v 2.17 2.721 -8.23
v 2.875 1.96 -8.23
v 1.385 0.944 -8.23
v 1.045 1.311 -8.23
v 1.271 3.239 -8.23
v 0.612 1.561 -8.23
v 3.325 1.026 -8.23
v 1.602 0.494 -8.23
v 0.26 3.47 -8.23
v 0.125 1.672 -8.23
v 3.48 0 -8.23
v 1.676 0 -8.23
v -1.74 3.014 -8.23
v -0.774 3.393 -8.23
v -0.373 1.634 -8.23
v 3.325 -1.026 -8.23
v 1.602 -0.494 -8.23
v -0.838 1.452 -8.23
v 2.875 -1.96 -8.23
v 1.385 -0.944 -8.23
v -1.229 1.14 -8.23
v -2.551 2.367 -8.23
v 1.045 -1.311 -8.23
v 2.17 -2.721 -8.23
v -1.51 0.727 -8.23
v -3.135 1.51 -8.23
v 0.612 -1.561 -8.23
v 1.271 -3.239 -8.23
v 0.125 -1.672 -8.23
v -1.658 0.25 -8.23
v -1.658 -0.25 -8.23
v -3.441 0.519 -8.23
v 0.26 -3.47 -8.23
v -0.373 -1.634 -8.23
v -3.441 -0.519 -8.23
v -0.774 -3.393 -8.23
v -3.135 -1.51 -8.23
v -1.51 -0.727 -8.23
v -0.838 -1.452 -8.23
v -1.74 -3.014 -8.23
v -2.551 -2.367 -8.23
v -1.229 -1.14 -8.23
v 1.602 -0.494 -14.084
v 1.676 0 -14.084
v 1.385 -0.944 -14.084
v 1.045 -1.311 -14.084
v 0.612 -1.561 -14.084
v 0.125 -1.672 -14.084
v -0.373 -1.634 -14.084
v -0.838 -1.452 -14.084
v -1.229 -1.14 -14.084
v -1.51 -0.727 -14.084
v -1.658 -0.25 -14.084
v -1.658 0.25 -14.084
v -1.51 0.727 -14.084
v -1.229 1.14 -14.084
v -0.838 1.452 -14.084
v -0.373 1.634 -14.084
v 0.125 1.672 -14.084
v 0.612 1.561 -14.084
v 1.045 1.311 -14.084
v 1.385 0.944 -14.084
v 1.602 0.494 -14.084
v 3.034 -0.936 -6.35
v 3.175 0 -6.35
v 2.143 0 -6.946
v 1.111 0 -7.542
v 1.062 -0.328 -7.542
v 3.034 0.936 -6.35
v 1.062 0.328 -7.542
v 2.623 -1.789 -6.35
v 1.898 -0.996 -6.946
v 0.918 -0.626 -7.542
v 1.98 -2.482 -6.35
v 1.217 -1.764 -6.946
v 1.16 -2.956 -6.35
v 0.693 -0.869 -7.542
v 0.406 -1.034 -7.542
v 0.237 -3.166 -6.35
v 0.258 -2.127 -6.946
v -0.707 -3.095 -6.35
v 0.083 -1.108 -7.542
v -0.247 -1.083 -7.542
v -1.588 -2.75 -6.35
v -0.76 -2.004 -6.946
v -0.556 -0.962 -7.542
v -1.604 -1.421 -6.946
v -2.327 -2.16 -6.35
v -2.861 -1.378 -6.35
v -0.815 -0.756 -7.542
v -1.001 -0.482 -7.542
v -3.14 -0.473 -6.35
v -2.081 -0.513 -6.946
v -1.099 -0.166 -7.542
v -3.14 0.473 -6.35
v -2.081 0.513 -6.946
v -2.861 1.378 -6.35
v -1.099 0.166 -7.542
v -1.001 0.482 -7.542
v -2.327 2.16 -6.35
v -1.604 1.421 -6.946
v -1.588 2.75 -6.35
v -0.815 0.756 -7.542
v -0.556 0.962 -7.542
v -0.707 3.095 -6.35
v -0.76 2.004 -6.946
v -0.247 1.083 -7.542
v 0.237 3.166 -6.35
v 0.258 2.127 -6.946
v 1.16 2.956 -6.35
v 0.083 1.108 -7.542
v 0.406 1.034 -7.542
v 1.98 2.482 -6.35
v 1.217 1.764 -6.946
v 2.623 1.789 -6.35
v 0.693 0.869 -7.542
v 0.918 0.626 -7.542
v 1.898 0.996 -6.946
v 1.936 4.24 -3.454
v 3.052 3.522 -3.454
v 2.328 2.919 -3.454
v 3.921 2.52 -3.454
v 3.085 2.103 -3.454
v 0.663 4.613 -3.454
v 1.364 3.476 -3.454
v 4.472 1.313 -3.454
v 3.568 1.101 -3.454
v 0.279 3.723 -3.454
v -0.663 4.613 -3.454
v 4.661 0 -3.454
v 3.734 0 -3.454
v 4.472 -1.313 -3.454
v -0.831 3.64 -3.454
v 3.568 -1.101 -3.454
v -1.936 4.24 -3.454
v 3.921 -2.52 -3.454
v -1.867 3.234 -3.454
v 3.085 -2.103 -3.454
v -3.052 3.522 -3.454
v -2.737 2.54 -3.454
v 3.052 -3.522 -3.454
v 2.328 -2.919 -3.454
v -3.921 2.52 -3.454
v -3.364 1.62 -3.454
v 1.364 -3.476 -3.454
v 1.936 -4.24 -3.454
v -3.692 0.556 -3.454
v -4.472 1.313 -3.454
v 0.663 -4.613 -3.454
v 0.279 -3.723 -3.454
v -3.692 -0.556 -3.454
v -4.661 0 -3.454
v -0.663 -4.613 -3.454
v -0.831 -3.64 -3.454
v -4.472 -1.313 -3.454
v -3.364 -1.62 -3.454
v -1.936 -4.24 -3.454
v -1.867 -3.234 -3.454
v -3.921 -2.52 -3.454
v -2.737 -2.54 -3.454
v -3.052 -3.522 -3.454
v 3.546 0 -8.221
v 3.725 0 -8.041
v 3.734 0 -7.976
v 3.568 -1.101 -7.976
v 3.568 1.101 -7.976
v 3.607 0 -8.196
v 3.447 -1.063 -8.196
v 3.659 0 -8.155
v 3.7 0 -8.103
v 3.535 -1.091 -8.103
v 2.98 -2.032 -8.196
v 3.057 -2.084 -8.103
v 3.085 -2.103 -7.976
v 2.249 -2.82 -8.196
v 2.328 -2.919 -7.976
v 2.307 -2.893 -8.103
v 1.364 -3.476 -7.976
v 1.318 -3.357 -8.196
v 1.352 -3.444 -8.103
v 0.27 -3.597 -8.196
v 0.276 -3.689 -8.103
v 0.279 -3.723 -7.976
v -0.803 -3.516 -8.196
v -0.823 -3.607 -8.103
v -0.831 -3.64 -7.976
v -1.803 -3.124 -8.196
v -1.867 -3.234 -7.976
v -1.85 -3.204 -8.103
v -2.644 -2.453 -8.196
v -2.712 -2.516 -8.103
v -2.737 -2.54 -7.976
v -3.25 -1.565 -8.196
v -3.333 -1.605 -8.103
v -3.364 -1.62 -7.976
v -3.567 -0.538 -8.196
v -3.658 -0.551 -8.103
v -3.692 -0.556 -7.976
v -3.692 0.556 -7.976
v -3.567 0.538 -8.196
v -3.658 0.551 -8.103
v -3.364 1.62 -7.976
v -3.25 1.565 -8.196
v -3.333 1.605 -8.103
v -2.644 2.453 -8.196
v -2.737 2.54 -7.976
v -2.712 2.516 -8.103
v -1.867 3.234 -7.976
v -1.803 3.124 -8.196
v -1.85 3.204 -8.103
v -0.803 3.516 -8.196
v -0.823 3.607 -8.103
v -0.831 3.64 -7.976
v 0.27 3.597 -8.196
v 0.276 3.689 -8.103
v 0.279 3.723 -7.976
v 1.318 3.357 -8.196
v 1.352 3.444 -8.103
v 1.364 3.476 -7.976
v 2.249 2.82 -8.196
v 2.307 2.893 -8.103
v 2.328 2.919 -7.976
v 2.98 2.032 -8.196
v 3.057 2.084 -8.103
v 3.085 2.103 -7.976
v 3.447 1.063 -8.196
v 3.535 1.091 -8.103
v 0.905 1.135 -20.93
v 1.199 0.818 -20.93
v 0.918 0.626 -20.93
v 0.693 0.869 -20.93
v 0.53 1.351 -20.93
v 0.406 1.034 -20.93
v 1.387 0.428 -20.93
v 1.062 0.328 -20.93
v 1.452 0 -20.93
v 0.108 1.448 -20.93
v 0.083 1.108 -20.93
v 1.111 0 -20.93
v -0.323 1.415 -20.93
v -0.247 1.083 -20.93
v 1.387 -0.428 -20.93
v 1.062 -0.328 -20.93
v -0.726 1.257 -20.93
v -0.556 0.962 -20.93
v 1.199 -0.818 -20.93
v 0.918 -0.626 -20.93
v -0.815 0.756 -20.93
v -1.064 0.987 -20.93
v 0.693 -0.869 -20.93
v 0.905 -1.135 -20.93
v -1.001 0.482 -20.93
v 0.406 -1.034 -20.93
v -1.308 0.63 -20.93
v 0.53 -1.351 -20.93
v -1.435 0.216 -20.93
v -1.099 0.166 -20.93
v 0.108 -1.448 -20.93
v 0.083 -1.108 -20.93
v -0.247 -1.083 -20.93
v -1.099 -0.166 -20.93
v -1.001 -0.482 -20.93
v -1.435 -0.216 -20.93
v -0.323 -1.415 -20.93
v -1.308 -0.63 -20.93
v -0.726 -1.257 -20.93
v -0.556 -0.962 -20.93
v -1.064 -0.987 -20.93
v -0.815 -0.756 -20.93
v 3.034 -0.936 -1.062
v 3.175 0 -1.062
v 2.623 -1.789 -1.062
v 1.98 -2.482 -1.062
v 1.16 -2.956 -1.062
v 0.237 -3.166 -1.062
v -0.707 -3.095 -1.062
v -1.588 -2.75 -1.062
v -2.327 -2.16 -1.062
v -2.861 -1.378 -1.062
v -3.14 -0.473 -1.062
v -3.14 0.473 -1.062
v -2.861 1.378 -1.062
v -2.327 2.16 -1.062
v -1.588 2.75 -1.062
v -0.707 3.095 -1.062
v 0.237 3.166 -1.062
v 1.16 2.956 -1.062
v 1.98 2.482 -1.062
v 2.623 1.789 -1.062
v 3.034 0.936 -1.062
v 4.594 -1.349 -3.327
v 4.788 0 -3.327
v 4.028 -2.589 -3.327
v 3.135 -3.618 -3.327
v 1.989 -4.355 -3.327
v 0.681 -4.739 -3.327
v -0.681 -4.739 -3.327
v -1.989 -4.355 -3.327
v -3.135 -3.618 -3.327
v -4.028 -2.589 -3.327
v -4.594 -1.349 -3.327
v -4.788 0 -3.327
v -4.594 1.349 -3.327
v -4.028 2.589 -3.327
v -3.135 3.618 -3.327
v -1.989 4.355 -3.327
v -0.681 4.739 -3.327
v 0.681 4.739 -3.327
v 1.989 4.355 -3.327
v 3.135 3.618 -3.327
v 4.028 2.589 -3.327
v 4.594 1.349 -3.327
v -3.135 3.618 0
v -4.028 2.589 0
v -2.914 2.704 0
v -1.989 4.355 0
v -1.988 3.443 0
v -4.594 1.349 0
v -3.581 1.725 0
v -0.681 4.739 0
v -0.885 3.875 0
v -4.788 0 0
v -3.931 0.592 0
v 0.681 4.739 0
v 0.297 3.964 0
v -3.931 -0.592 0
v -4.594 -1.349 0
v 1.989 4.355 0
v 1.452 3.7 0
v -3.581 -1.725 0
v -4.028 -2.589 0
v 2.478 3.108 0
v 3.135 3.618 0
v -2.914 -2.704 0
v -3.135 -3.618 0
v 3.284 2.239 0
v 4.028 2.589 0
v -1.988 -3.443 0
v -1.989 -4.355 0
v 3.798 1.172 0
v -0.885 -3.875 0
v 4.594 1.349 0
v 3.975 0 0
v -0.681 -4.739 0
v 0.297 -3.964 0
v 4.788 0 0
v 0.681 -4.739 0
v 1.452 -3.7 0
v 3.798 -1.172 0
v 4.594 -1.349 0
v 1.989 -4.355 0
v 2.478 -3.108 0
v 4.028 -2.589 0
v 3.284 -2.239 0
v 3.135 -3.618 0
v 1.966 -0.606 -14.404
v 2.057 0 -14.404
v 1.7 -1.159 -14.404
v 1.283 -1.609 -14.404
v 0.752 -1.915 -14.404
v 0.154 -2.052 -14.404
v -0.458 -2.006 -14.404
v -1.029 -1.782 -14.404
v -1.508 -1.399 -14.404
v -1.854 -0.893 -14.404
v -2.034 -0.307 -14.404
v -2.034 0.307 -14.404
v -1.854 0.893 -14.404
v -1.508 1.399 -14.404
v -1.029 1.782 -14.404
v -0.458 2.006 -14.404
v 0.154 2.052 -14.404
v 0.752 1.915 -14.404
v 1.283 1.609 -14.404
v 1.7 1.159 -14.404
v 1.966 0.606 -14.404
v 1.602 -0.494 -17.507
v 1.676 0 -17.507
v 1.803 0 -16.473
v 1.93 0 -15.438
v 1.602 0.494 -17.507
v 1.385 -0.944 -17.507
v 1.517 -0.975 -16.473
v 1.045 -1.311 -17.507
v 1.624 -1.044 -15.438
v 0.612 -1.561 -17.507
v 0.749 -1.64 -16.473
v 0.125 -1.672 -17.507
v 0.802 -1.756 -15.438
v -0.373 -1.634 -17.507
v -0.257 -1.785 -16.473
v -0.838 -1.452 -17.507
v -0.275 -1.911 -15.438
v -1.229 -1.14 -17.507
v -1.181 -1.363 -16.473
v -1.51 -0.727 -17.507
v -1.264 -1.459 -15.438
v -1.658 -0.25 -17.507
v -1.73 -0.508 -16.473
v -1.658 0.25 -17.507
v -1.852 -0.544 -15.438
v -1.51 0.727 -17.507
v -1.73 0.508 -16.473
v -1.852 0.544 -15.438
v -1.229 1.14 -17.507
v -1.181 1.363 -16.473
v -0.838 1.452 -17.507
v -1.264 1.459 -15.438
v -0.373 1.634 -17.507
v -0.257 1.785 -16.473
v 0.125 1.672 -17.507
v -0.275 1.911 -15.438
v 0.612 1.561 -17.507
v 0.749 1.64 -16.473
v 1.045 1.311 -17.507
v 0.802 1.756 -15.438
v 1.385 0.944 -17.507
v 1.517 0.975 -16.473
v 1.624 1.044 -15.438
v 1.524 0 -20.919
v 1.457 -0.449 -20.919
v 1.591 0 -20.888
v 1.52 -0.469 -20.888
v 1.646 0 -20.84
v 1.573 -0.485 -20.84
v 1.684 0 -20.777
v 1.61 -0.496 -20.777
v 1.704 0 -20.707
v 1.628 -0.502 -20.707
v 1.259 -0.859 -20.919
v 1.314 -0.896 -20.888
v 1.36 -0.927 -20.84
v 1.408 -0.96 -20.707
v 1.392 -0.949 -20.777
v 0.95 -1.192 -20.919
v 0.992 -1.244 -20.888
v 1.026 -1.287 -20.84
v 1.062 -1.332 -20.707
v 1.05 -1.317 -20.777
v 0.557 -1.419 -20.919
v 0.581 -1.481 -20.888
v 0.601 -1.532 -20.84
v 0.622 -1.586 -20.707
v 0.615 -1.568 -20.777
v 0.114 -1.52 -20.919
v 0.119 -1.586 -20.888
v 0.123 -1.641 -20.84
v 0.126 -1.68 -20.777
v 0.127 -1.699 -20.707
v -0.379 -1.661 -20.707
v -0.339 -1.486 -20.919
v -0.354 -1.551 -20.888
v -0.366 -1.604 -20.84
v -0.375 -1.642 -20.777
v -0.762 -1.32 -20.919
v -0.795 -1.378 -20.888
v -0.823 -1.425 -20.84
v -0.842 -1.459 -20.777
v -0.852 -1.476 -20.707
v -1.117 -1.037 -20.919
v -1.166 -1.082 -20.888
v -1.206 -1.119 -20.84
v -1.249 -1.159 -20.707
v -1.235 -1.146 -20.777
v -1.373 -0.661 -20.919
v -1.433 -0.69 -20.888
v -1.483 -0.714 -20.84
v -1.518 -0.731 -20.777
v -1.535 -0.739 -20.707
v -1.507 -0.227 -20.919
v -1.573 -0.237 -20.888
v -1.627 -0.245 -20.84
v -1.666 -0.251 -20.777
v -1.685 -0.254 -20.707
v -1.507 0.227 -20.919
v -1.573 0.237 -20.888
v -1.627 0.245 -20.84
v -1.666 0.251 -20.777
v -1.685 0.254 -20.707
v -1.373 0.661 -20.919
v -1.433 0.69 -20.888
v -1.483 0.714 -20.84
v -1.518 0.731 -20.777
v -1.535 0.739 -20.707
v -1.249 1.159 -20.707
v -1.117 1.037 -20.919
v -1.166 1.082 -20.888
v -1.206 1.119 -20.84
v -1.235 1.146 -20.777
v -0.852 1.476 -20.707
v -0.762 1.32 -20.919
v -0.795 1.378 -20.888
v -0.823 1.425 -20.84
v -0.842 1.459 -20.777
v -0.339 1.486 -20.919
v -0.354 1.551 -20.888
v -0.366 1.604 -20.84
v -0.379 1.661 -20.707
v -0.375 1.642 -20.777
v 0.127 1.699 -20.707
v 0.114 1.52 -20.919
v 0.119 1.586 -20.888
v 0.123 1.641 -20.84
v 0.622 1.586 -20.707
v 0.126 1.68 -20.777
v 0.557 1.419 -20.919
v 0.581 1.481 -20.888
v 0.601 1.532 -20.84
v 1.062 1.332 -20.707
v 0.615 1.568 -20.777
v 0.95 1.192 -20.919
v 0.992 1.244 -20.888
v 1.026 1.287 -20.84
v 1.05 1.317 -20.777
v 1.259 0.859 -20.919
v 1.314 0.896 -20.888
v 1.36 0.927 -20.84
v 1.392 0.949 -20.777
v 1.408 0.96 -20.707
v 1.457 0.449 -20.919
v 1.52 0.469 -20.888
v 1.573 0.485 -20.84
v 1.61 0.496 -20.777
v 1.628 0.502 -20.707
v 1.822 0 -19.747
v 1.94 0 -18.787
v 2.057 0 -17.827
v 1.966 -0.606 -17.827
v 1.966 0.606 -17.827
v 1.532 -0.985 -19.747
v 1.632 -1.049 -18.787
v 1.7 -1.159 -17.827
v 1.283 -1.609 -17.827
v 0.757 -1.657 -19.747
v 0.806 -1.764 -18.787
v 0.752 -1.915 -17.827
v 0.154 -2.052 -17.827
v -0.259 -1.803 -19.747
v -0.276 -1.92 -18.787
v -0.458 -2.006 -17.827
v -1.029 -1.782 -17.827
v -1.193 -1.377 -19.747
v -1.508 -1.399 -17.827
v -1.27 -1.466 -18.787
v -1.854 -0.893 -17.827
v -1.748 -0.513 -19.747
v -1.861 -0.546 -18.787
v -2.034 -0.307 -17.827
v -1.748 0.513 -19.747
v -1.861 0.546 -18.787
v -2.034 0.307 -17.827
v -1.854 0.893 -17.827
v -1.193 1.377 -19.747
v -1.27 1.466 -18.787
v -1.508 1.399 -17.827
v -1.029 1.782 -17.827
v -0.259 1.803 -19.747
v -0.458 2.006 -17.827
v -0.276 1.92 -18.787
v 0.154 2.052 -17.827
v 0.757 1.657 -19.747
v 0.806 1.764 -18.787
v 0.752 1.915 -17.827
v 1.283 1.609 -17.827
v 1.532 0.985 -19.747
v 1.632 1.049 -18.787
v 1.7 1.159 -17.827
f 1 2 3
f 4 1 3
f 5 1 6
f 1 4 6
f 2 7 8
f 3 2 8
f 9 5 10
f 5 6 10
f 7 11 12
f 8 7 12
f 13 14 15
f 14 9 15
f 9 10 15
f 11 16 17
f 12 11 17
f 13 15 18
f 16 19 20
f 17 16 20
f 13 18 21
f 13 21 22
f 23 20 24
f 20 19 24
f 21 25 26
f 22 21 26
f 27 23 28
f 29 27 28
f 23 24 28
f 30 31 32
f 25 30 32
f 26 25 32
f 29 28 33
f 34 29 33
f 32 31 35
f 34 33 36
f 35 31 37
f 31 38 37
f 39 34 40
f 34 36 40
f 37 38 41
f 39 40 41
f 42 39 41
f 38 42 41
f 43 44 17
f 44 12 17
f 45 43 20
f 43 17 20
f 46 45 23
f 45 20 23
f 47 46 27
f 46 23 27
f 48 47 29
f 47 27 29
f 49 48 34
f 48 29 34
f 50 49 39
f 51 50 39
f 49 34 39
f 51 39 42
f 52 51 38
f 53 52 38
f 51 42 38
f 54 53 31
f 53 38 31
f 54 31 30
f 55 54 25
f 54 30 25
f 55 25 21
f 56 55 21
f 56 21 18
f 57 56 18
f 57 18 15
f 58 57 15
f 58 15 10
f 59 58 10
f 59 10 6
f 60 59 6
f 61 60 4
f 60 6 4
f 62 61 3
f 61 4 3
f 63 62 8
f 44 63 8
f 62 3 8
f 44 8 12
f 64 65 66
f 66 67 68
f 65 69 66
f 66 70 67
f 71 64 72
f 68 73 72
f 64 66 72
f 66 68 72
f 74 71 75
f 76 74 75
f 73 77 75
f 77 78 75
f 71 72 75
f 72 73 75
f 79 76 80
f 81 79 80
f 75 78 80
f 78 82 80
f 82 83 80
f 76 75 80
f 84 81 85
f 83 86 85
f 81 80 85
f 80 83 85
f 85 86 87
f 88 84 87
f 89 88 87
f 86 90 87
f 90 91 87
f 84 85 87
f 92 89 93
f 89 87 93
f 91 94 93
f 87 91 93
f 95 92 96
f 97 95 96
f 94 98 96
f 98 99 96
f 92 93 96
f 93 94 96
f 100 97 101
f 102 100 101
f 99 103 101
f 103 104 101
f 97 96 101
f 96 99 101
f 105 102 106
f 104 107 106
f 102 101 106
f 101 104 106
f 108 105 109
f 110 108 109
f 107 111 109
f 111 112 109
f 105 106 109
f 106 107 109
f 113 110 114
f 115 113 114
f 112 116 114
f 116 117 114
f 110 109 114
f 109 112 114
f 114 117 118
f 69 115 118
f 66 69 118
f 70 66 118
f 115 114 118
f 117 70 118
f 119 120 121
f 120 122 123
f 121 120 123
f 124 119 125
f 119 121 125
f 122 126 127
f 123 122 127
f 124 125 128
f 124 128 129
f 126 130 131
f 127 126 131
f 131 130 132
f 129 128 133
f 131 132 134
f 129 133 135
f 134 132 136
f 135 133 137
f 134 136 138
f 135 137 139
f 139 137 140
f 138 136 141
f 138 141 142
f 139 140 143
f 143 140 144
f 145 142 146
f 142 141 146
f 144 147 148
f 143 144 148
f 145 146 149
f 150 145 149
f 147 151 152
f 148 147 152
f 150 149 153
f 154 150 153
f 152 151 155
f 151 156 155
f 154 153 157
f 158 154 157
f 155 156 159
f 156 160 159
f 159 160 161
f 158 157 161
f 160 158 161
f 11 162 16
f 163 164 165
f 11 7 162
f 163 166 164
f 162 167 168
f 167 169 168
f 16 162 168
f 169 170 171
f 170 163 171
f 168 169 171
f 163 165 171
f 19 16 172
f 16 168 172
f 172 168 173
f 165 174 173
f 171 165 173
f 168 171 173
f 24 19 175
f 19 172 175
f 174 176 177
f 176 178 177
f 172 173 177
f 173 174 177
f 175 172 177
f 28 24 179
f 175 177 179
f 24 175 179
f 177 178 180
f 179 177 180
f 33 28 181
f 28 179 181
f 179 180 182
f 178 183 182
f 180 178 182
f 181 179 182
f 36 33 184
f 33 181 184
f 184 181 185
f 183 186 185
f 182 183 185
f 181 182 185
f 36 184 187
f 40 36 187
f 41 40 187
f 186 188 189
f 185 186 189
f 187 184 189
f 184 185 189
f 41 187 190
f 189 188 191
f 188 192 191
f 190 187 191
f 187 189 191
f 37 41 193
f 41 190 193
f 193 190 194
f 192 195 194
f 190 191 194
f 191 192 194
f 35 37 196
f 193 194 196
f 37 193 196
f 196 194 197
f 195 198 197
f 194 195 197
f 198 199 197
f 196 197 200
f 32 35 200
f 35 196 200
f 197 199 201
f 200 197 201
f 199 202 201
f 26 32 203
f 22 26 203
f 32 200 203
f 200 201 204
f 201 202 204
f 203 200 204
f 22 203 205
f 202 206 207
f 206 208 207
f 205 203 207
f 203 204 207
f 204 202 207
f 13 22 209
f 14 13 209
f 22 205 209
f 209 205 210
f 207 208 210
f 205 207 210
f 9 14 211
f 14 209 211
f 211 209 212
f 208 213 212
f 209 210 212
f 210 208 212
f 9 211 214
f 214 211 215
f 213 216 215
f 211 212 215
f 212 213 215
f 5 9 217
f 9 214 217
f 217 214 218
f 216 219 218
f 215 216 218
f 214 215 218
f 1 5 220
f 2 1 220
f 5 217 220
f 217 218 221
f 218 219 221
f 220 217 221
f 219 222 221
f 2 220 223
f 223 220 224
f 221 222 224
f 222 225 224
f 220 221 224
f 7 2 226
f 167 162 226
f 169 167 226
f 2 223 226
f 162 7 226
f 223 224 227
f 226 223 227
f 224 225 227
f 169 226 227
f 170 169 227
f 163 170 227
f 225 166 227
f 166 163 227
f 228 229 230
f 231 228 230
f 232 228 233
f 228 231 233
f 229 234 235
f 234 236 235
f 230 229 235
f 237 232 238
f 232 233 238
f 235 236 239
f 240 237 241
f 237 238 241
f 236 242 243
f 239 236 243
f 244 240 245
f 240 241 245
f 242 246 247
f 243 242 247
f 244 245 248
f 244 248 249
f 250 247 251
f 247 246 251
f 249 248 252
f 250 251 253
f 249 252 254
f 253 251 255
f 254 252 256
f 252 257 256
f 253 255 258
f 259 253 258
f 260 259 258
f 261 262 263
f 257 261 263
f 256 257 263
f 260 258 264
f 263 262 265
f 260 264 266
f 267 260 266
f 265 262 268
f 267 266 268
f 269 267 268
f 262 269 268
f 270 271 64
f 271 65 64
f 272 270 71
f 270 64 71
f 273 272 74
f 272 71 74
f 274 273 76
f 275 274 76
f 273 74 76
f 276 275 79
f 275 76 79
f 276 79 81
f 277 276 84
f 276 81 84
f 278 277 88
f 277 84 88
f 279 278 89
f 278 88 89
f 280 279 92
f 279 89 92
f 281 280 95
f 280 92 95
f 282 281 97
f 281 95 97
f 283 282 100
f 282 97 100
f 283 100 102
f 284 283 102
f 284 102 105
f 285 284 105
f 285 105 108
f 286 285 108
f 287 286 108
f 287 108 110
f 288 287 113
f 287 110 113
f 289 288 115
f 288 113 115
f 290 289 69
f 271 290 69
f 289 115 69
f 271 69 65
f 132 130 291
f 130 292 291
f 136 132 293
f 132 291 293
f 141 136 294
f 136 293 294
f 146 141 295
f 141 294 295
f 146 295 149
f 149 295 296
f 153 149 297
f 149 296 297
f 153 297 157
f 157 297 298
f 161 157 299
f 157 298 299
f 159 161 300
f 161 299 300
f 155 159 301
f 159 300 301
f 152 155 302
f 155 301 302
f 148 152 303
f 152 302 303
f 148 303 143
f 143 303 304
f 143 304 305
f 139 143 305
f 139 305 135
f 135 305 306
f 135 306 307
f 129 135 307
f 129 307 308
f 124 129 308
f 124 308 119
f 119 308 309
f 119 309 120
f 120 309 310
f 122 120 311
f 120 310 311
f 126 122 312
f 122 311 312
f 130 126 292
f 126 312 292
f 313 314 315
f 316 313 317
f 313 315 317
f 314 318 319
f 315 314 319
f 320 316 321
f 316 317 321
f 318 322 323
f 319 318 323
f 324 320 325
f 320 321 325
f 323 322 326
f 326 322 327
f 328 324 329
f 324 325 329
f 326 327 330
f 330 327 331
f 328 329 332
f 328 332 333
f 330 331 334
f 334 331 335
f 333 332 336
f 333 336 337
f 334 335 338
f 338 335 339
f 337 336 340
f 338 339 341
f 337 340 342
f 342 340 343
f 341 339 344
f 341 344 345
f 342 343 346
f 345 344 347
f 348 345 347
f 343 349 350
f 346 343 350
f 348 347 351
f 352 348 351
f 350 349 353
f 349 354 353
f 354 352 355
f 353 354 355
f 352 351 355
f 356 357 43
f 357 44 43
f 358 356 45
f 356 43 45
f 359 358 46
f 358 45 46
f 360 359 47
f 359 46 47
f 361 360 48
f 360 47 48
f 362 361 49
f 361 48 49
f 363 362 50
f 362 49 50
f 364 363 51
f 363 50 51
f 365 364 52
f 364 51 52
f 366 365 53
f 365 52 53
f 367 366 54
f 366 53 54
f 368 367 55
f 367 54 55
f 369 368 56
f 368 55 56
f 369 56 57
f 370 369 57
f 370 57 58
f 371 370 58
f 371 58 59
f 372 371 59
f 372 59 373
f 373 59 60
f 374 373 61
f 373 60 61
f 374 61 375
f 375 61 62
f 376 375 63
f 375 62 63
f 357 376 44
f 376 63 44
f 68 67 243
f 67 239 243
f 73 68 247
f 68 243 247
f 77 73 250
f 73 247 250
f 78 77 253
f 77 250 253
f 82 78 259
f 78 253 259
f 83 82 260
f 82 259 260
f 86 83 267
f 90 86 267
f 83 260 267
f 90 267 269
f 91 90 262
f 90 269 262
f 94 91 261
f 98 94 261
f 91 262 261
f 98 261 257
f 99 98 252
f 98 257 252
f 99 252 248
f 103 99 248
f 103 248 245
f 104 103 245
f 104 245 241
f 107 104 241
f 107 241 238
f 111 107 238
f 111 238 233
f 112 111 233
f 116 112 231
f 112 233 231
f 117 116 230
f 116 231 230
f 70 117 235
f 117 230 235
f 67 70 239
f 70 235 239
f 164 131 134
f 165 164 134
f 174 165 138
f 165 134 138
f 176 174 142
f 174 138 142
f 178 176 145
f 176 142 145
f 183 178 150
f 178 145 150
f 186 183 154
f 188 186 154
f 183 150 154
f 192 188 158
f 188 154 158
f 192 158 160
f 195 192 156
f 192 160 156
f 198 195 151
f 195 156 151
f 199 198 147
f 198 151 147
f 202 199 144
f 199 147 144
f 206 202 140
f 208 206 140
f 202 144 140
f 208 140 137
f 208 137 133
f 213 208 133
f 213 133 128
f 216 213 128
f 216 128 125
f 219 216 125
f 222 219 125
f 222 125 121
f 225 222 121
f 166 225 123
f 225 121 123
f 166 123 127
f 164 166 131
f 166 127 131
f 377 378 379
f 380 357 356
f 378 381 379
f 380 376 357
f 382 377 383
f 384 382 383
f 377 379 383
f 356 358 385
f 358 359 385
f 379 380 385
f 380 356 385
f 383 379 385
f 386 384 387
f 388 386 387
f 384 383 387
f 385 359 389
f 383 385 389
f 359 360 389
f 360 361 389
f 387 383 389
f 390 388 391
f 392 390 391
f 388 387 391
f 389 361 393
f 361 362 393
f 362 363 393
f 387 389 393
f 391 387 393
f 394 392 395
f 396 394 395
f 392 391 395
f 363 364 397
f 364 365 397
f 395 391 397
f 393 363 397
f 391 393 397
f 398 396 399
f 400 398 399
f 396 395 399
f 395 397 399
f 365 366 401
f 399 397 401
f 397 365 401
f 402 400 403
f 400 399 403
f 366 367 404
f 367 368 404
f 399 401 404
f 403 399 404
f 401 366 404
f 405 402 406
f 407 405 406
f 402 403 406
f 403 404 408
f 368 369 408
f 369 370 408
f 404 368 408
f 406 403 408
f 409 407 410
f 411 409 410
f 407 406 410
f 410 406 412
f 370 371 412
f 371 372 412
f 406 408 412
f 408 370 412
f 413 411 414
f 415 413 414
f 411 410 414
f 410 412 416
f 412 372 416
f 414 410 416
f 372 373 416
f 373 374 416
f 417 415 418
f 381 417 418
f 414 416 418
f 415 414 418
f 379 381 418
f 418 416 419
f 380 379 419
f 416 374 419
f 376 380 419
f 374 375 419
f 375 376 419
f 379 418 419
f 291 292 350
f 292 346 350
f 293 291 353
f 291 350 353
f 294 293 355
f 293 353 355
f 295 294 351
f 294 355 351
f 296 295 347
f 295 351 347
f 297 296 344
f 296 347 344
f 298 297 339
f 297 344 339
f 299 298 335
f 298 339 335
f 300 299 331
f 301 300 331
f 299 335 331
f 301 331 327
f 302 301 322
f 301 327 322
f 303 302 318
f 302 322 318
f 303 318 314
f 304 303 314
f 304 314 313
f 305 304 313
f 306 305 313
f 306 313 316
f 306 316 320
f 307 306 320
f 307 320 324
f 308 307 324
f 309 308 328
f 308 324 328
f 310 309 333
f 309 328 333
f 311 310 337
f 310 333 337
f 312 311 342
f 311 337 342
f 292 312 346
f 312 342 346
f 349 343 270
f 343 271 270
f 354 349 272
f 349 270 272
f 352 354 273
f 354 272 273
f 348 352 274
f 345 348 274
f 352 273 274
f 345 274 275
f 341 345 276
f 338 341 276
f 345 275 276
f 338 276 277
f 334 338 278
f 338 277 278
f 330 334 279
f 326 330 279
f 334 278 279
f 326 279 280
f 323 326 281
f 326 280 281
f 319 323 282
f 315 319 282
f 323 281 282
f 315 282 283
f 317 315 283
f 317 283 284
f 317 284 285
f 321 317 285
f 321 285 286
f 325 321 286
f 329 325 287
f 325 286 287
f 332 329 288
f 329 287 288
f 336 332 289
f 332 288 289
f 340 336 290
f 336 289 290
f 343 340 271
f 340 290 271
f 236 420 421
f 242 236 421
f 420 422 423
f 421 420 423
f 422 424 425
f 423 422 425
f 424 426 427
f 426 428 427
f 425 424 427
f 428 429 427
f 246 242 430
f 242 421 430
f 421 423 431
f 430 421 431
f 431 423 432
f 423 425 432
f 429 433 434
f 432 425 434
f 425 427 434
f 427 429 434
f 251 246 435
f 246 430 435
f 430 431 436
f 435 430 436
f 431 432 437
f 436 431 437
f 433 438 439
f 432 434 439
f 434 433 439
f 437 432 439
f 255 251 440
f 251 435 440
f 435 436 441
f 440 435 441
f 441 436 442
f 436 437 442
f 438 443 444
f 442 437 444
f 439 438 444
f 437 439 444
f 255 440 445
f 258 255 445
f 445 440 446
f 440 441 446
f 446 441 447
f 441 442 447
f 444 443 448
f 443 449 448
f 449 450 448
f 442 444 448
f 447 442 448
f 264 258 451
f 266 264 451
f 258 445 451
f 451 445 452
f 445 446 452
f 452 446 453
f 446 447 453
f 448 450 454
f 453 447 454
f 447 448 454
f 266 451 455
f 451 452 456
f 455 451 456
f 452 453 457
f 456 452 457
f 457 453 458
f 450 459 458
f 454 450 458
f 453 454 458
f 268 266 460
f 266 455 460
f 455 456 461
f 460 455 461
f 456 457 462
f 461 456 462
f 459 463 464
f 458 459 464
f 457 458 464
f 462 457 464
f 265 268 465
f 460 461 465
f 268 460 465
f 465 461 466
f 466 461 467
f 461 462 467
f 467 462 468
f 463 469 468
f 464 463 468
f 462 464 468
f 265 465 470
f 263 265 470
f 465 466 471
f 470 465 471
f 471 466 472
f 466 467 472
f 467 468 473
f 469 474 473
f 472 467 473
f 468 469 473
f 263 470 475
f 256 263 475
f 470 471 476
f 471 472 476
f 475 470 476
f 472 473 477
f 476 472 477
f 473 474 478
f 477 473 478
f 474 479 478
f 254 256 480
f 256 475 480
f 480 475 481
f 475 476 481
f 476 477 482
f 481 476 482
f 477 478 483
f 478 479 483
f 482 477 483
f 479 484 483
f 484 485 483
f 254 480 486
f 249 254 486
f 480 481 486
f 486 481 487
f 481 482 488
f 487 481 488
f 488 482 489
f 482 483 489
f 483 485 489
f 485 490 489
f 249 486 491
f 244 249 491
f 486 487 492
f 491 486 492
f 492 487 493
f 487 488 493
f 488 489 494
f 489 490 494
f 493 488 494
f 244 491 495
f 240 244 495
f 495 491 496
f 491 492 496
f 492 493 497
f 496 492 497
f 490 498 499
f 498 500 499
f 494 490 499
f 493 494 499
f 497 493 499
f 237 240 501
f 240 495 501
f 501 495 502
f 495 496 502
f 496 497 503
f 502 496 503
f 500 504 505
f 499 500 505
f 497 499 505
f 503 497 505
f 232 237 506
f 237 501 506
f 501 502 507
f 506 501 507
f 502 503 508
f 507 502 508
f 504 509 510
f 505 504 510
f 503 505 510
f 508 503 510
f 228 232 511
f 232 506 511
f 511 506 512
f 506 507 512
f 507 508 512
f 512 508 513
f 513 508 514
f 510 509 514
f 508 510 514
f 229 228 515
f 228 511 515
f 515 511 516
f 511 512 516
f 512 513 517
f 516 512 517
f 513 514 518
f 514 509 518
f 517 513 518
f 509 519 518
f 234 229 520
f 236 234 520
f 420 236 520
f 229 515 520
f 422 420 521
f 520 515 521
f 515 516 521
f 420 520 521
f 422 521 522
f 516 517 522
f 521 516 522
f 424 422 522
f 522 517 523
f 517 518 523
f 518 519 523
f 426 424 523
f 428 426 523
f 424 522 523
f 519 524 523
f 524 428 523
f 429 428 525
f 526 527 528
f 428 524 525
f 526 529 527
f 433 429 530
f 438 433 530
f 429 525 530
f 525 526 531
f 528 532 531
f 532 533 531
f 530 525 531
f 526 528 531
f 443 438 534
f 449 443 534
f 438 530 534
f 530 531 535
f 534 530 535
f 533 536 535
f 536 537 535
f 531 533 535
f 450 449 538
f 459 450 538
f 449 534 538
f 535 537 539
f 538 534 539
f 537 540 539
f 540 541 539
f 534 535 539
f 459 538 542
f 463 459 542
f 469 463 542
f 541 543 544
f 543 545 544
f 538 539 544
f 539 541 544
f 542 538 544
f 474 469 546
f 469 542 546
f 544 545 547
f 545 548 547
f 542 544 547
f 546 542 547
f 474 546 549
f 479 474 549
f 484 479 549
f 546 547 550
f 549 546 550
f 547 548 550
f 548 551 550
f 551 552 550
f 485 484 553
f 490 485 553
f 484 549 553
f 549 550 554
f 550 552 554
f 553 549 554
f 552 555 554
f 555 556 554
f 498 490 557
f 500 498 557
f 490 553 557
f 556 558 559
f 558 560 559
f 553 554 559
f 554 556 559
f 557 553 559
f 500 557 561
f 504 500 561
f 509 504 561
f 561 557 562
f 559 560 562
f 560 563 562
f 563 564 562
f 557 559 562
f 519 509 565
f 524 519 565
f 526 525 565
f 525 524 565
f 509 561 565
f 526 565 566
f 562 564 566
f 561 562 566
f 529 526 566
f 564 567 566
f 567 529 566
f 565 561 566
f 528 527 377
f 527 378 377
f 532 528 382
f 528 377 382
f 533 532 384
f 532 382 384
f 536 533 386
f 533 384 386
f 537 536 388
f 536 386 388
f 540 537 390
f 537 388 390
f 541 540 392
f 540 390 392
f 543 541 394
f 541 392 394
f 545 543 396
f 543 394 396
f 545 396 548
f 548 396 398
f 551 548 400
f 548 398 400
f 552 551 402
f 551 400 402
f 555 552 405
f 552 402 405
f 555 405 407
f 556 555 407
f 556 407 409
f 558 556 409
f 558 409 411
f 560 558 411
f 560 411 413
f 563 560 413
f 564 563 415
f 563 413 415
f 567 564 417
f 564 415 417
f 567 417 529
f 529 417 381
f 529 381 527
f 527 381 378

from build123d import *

# Parameters (mm, degrees)
FILLET2_R = 0.254


with BuildPart() as part:
    # Sketch1 → Revolve1 (revolve)
    with BuildSketch(Plane(origin=(0, 0, 0), x_dir=(0, 0, -1), z_dir=(1, 0, 0)), mode=Mode.PRIVATE) as revolve1_sk:
        Polygon((7.541506618, 1.11125), (20.9296, 1.11125), (20.9296, 1.6764), (17.826604011, 2.0574), (17.506907051, 1.6764), (14.403911062, 2.0574), (14.084214103, 1.6764), (8.2296, 1.6764), (8.2296, 3.7338), (3.4544, 3.7338), (3.4544, 4.6609), (3.3274, 4.7879), (0, 4.7879), (0, 3.9751), (1.061768562, 3.175), (6.35, 3.175), align=None)
    revolve(revolve1_sk.sketch.rotate(Axis((0, 0, -9.412698919), (0, 0, -1)), 90), axis=Axis((0, 0, -9.412698919), (0, 0, -1)))

    # Fillet2
    fillet2_edges = [part.edges().sort_by_distance(p)[0] for p in [
        (-3.7338, 0, -8.2296),
        (-1.6764, 0, -20.9296),
    ]]
    fillet(fillet2_edges, radius=FILLET2_R)


solid = part.part
